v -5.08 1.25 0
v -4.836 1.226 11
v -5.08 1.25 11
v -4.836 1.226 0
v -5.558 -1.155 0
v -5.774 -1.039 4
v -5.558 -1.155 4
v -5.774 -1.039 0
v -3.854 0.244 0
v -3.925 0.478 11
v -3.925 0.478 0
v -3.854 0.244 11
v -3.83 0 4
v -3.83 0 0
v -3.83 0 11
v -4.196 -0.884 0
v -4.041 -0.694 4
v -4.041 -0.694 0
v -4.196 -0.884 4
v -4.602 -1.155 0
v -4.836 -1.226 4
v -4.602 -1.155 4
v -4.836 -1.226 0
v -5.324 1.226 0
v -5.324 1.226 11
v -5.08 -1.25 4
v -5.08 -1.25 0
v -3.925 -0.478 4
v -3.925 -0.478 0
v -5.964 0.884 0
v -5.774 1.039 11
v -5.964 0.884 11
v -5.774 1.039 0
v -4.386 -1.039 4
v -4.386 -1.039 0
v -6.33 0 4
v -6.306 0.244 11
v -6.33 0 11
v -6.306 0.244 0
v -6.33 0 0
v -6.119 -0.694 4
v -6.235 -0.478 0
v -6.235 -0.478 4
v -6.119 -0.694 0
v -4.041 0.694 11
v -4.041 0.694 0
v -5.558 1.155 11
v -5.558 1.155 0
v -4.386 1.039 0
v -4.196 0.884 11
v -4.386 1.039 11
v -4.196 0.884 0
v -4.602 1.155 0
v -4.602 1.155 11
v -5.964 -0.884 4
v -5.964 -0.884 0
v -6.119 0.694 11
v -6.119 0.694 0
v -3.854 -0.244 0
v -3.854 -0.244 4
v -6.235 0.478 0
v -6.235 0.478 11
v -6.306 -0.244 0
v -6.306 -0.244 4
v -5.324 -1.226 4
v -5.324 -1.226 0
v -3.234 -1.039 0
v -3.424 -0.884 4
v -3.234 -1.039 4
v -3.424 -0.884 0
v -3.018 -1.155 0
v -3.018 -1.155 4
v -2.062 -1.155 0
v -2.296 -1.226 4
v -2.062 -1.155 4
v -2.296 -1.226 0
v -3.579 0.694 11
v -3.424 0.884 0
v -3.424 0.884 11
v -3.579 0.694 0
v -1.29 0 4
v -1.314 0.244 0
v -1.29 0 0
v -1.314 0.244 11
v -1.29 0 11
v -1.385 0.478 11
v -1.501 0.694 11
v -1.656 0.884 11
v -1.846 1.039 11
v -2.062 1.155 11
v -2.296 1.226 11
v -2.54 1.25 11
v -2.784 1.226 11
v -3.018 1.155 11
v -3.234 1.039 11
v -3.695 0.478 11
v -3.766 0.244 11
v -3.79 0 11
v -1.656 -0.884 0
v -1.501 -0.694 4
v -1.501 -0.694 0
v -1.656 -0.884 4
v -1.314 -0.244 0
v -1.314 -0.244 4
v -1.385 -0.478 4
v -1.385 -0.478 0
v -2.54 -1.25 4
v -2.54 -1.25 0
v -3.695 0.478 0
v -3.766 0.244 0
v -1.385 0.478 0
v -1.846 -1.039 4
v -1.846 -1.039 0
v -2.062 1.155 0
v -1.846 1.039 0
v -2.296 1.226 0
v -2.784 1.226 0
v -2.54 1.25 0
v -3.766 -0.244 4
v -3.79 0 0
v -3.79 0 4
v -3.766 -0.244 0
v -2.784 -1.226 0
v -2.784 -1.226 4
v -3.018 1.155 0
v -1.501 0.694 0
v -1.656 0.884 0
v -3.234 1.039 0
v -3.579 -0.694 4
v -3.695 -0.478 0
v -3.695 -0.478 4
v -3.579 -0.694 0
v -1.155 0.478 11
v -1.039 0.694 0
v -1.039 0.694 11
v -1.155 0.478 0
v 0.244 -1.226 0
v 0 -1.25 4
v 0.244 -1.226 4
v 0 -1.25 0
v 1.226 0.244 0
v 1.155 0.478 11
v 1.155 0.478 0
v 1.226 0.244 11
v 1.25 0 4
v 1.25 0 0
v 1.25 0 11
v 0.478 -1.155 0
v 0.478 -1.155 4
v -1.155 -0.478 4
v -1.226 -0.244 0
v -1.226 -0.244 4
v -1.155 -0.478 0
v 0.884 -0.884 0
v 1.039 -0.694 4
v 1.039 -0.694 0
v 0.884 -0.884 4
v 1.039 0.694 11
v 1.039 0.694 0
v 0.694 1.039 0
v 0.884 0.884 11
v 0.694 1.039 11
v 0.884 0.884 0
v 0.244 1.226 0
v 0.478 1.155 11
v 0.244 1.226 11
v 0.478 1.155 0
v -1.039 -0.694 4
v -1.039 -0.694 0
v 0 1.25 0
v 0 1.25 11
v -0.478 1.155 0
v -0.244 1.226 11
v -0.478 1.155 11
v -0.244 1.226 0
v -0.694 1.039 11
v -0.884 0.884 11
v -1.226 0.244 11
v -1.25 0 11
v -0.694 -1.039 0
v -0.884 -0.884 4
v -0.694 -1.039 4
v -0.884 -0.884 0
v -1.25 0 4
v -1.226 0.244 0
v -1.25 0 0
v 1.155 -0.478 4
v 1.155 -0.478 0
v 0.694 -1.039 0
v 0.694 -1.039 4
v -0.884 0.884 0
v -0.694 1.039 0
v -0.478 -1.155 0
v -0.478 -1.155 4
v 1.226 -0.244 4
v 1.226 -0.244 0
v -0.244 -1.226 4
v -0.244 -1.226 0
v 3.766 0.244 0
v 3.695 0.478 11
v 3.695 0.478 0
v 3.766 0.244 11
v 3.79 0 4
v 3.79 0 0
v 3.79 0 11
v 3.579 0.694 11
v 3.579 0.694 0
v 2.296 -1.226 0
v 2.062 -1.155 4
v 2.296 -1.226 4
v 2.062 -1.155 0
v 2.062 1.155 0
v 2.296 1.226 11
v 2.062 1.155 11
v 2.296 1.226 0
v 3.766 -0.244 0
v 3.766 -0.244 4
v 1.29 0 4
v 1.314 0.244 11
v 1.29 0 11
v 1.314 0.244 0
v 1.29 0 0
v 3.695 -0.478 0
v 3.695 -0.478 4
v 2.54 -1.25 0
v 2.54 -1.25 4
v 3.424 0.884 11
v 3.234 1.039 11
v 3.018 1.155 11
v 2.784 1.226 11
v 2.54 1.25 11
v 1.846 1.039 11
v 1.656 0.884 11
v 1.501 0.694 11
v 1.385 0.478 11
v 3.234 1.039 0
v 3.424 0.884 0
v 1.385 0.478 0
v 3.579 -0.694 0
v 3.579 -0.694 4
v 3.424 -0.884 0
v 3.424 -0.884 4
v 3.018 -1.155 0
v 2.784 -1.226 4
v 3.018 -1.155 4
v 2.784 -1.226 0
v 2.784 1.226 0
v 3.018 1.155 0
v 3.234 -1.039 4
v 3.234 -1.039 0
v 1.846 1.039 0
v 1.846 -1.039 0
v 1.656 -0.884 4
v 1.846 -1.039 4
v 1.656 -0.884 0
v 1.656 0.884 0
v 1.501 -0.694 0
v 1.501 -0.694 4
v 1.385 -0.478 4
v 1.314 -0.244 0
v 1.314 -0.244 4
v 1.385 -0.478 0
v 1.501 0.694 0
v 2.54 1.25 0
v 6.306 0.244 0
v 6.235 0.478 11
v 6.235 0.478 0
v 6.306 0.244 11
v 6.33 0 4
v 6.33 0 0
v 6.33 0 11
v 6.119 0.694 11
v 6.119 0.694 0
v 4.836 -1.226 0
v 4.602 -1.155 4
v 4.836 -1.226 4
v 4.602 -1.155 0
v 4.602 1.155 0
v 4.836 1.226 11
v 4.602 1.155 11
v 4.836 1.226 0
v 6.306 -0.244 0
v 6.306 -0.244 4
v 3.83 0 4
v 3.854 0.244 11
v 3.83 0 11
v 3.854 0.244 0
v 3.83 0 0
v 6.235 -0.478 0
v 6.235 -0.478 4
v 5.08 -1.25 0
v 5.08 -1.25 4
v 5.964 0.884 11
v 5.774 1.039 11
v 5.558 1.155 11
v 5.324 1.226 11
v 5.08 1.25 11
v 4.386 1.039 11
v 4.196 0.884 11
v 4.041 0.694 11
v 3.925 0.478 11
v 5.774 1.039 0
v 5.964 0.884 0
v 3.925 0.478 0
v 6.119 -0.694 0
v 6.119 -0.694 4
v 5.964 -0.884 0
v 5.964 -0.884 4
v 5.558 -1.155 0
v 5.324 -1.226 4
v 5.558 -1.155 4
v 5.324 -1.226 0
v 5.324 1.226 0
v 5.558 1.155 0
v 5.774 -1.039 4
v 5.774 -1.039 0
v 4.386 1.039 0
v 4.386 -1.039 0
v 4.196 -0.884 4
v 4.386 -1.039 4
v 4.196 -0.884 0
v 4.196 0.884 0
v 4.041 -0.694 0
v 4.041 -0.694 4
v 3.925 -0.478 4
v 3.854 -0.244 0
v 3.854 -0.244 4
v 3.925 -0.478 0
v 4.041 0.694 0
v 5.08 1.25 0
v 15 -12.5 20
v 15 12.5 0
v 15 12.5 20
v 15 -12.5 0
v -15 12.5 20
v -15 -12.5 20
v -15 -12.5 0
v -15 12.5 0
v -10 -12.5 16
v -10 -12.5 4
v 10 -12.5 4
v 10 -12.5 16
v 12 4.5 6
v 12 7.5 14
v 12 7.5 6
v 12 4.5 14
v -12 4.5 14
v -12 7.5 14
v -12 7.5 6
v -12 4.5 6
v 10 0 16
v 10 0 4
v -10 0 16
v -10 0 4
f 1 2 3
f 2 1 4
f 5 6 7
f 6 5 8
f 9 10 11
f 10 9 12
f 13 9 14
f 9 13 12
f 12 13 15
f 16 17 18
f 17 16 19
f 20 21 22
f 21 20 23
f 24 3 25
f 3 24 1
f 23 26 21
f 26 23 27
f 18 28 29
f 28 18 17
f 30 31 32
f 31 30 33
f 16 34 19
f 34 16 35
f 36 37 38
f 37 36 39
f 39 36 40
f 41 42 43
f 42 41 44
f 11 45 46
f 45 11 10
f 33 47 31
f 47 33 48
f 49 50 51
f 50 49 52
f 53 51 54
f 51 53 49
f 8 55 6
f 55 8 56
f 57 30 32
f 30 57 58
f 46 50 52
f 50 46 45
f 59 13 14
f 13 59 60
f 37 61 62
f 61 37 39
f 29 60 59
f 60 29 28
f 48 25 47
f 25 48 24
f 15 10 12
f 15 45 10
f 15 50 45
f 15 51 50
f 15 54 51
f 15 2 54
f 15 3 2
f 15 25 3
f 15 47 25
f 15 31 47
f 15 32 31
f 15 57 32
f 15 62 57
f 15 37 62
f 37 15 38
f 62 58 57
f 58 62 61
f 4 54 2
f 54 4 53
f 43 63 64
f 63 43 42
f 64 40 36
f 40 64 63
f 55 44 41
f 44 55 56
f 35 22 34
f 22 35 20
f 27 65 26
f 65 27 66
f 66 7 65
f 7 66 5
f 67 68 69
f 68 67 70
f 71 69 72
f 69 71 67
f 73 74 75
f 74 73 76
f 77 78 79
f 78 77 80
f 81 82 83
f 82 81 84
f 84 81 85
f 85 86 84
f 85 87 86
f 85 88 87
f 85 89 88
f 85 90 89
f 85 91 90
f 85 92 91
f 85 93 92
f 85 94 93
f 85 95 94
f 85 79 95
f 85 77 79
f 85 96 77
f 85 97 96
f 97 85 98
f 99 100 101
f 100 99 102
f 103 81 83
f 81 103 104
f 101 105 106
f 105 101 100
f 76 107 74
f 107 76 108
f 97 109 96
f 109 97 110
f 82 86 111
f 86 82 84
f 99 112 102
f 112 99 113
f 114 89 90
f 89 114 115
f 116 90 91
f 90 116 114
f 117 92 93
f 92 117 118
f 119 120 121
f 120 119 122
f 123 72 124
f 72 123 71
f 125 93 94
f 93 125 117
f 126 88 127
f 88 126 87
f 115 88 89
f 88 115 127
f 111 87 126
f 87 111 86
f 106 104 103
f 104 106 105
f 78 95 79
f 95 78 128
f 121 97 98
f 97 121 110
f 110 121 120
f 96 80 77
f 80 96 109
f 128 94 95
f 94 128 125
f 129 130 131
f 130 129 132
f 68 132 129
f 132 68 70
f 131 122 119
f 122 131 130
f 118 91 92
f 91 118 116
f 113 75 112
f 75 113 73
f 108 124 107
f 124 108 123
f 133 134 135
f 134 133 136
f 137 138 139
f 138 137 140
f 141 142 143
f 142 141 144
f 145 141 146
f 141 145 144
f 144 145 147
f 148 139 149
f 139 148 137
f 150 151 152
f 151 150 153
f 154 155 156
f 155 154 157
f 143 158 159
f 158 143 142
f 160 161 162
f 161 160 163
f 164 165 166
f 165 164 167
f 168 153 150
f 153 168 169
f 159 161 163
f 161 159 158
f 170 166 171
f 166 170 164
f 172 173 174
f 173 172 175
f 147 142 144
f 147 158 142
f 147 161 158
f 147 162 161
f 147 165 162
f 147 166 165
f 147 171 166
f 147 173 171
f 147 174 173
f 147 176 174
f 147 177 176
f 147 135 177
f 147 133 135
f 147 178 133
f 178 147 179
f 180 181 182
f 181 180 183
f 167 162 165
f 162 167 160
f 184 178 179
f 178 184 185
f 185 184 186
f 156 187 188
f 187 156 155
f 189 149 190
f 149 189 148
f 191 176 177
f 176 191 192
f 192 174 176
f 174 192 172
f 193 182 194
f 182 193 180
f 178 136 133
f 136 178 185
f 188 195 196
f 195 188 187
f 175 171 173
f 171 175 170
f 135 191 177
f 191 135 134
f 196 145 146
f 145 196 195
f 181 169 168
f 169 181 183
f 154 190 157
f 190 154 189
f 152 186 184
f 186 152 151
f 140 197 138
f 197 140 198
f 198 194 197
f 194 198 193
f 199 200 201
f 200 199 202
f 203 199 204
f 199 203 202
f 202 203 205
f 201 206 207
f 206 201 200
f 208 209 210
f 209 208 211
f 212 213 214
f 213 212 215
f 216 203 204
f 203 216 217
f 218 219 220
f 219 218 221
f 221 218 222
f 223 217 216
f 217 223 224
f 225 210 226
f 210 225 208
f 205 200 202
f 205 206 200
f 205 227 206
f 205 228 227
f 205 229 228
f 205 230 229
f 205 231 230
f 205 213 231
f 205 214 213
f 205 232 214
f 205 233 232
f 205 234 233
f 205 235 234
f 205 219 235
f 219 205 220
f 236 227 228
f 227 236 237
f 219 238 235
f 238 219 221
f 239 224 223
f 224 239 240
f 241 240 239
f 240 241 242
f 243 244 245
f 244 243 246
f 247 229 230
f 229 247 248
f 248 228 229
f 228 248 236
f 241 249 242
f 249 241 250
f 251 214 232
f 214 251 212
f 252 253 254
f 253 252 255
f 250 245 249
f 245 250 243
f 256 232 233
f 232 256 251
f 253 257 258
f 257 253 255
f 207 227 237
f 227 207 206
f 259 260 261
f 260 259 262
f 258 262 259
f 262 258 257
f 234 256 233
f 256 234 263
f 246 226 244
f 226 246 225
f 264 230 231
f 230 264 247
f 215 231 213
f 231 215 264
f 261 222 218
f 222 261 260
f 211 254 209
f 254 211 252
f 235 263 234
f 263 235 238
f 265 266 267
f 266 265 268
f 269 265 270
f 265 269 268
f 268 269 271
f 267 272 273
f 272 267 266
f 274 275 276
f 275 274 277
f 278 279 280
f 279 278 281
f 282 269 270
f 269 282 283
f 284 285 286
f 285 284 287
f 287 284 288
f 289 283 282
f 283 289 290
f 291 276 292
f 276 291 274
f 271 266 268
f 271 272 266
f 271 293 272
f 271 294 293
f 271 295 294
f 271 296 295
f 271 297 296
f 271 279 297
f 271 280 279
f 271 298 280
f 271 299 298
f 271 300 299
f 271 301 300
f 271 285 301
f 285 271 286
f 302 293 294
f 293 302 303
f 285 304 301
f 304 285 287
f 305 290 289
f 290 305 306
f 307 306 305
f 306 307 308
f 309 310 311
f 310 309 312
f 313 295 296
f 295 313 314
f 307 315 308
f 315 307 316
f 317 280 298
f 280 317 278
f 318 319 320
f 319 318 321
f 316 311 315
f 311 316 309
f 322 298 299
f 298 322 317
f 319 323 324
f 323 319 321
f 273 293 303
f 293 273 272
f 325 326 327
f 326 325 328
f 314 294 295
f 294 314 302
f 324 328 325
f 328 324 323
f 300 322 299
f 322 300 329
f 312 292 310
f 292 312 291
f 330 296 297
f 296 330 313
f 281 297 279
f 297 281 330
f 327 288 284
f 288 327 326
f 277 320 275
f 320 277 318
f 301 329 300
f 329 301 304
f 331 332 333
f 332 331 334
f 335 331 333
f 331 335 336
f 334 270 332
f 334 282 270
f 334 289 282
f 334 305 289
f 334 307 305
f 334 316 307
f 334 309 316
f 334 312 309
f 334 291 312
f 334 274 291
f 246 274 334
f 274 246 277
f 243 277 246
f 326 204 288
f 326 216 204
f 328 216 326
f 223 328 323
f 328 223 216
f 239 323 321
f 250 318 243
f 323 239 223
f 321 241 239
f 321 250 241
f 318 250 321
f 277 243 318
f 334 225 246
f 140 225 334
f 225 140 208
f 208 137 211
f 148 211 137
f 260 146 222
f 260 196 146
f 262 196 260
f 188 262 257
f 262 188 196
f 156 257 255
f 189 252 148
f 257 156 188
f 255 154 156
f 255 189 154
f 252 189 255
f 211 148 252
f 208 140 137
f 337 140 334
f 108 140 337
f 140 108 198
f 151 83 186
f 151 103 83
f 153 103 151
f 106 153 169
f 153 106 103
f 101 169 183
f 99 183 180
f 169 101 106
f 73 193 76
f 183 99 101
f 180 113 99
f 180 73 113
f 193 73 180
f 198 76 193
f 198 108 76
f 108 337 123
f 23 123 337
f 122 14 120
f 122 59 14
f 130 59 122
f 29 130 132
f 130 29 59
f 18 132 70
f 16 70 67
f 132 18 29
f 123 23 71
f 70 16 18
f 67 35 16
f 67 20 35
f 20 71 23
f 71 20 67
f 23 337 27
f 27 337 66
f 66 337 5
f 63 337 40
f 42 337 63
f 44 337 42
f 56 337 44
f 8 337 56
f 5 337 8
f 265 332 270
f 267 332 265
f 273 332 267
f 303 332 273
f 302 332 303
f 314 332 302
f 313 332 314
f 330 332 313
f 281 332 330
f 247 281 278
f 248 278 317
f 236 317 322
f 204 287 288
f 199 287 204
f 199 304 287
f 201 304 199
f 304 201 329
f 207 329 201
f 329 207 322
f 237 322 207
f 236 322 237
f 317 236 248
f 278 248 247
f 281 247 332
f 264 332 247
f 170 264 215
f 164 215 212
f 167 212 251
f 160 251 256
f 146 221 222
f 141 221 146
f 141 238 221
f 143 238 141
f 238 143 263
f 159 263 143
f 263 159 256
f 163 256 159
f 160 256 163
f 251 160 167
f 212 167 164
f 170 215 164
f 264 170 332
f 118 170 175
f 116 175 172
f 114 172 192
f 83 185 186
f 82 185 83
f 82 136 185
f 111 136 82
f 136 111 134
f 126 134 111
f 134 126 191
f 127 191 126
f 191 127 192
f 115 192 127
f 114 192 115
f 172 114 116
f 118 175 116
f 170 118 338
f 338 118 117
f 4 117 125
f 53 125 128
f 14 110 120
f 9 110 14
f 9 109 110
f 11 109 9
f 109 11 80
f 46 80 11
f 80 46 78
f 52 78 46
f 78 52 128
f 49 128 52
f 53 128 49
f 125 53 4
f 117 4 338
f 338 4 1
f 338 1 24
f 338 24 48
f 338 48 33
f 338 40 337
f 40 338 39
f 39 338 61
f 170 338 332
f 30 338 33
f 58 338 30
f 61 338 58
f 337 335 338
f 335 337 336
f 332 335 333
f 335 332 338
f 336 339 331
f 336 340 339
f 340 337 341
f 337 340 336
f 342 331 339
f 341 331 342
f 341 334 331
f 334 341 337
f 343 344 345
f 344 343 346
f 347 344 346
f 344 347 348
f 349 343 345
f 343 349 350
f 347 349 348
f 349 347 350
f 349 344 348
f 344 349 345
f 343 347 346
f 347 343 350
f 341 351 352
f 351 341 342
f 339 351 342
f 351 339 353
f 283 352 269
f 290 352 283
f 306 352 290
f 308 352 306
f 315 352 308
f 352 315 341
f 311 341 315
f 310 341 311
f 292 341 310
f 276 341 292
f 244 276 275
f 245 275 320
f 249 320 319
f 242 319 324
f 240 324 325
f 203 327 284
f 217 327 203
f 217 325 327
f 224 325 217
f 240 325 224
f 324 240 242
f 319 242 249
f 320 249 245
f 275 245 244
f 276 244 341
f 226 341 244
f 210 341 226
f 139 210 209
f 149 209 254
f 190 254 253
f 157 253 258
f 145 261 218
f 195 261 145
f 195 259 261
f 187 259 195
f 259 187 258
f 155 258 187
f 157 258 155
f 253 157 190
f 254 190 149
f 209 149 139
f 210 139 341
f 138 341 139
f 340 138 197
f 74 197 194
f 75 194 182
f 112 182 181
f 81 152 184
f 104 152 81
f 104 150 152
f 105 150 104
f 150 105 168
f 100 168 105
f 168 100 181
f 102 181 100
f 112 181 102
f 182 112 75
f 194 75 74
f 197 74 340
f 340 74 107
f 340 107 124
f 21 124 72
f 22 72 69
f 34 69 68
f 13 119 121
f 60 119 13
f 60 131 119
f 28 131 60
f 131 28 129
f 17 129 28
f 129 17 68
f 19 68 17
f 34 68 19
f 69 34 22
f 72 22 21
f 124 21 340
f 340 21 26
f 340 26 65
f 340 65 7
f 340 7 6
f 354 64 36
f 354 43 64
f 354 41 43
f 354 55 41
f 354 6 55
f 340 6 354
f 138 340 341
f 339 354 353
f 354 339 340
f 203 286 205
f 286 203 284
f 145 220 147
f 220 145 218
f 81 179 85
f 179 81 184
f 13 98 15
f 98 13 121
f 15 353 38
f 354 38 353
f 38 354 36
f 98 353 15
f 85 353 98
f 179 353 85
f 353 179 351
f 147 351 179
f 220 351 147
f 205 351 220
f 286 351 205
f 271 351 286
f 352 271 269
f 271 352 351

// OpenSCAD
// file: parameters.scad
// SmartPaddle — Parametric Enclosure Parameters
// All dimensions in millimeters

// === Handle (Butterfly Timo Boll ALC FL: 100×25×34 mm) ===
handle_length = 100;
handle_neck_w = 24;       // width at blade junction
handle_butt_w = 34;       // width at butt (FL flare)
handle_thickness = 25;    // front-back thickness
handle_corner_r = 3;      // cross-section corner radius
// Legacy aliases used by battery cover / jig
handle_width = handle_butt_w;
handle_height = handle_thickness;
wall_thickness = 2.0;

// === Internal Cavities ===
pcb_cavity_w = 29;    // PCB is 28mm wide, +0.5mm clearance each side
pcb_cavity_h = 8;     // Board + components height
pcb_cavity_l = 85;    // PCB is 85mm long
pcb_y_offset = -3;    // PCB cavity vertical offset from handle center

battery_cavity_w = 21;
battery_cavity_h = 6;
battery_cavity_l = 40;
battery_y_offset = pcb_y_offset + pcb_cavity_h/2 + battery_cavity_h/2 + 1; // Below PCB

// === USB-C cutout ===
usb_cutout_w = 9;
usb_cutout_h = 3.5;
usb_cutout_z = 2;     // Height from handle back face

// === Mounting bosses ===
boss_diameter = 4.2;  // M2 clearance hole
boss_height = 5;
boss_wall = 2;

// === Ventilation ===
vent_slot_w = 1.5;
vent_slot_l = 15;
vent_count = 3;

// === Blade junction ===
blade_neck_w = 24;    // FL neck width where handle meets blade
blade_neck_l = 15;    // Length of neck section
blade_neck_h = 6;     // Neck thickness

// === Battery Cover ===
cover_tolerance = 0.2; // Snap-fit clearance
cover_lip_h = 1.5;     // Lip height for snap fit
cover_lip_w = 1.0;     // Lip width
cover_fingernail_r = 5; // Fingernail opening radius

// === Battery ===
battery_w = 20;
battery_h = 5;
battery_l = 35;

// === Hex grip pattern ===
hex_size = 4;
hex_depth = 0.5;
hex_spacing = 6;
// main file
// SmartPaddle — Programming Pogo Pin Jig
// 3D-printed alignment fixture for flashing firmware
// 5x pogo pins (3.3V, GND, SWD_CLK, SWD_DIO, EN)
// Pogo pins: P75-B1 (1.27mm pitch standard)

include <parameters.scad>

pogo_pin_count = 5;
pogo_pitch = 1.27 * 2;  // 2.54mm between pogo pins
pogo_pin_d = 1.4;        // P75-B1 pin diameter
pogo_body_d = 2.5;       // Spring body diameter (press-fit)
pogo_body_l = 15;        // Spring body length

jig_wall = 3;
jig_body_w = 30;
jig_body_h = 25;
jig_body_l = 20;

module prog_jig() {
    difference() {
        // Main jig body
        translate([0, 0, jig_body_l/2])
            cube([jig_body_w, jig_body_h, jig_body_l], center=true);

        // Pogo pin holes (press-fit)
        for (i = [0:pogo_pin_count-1]) {
            x = (i - (pogo_pin_count-1)/2) * pogo_pitch;
            translate([x, 0, 0]) {
                // Pin hole
                cylinder(d=pogo_body_d, h=jig_body_l+2, center=true, $fn=32);
            }
        }

        // PCB alignment slot (holds edge of PCB)
        translate([0, pcb_cavity_h/2 + 2, jig_body_l/2])
            cube([jig_body_w - jig_wall*2, 3, 8], center=true);

        // Access window (to see pogo pin contact)
        translate([0, -pogo_body_l/2, jig_body_l/2])
            cube([jig_body_w - 10, jig_body_h - 10, 12], center=true);
    }
}

prog_jig();
